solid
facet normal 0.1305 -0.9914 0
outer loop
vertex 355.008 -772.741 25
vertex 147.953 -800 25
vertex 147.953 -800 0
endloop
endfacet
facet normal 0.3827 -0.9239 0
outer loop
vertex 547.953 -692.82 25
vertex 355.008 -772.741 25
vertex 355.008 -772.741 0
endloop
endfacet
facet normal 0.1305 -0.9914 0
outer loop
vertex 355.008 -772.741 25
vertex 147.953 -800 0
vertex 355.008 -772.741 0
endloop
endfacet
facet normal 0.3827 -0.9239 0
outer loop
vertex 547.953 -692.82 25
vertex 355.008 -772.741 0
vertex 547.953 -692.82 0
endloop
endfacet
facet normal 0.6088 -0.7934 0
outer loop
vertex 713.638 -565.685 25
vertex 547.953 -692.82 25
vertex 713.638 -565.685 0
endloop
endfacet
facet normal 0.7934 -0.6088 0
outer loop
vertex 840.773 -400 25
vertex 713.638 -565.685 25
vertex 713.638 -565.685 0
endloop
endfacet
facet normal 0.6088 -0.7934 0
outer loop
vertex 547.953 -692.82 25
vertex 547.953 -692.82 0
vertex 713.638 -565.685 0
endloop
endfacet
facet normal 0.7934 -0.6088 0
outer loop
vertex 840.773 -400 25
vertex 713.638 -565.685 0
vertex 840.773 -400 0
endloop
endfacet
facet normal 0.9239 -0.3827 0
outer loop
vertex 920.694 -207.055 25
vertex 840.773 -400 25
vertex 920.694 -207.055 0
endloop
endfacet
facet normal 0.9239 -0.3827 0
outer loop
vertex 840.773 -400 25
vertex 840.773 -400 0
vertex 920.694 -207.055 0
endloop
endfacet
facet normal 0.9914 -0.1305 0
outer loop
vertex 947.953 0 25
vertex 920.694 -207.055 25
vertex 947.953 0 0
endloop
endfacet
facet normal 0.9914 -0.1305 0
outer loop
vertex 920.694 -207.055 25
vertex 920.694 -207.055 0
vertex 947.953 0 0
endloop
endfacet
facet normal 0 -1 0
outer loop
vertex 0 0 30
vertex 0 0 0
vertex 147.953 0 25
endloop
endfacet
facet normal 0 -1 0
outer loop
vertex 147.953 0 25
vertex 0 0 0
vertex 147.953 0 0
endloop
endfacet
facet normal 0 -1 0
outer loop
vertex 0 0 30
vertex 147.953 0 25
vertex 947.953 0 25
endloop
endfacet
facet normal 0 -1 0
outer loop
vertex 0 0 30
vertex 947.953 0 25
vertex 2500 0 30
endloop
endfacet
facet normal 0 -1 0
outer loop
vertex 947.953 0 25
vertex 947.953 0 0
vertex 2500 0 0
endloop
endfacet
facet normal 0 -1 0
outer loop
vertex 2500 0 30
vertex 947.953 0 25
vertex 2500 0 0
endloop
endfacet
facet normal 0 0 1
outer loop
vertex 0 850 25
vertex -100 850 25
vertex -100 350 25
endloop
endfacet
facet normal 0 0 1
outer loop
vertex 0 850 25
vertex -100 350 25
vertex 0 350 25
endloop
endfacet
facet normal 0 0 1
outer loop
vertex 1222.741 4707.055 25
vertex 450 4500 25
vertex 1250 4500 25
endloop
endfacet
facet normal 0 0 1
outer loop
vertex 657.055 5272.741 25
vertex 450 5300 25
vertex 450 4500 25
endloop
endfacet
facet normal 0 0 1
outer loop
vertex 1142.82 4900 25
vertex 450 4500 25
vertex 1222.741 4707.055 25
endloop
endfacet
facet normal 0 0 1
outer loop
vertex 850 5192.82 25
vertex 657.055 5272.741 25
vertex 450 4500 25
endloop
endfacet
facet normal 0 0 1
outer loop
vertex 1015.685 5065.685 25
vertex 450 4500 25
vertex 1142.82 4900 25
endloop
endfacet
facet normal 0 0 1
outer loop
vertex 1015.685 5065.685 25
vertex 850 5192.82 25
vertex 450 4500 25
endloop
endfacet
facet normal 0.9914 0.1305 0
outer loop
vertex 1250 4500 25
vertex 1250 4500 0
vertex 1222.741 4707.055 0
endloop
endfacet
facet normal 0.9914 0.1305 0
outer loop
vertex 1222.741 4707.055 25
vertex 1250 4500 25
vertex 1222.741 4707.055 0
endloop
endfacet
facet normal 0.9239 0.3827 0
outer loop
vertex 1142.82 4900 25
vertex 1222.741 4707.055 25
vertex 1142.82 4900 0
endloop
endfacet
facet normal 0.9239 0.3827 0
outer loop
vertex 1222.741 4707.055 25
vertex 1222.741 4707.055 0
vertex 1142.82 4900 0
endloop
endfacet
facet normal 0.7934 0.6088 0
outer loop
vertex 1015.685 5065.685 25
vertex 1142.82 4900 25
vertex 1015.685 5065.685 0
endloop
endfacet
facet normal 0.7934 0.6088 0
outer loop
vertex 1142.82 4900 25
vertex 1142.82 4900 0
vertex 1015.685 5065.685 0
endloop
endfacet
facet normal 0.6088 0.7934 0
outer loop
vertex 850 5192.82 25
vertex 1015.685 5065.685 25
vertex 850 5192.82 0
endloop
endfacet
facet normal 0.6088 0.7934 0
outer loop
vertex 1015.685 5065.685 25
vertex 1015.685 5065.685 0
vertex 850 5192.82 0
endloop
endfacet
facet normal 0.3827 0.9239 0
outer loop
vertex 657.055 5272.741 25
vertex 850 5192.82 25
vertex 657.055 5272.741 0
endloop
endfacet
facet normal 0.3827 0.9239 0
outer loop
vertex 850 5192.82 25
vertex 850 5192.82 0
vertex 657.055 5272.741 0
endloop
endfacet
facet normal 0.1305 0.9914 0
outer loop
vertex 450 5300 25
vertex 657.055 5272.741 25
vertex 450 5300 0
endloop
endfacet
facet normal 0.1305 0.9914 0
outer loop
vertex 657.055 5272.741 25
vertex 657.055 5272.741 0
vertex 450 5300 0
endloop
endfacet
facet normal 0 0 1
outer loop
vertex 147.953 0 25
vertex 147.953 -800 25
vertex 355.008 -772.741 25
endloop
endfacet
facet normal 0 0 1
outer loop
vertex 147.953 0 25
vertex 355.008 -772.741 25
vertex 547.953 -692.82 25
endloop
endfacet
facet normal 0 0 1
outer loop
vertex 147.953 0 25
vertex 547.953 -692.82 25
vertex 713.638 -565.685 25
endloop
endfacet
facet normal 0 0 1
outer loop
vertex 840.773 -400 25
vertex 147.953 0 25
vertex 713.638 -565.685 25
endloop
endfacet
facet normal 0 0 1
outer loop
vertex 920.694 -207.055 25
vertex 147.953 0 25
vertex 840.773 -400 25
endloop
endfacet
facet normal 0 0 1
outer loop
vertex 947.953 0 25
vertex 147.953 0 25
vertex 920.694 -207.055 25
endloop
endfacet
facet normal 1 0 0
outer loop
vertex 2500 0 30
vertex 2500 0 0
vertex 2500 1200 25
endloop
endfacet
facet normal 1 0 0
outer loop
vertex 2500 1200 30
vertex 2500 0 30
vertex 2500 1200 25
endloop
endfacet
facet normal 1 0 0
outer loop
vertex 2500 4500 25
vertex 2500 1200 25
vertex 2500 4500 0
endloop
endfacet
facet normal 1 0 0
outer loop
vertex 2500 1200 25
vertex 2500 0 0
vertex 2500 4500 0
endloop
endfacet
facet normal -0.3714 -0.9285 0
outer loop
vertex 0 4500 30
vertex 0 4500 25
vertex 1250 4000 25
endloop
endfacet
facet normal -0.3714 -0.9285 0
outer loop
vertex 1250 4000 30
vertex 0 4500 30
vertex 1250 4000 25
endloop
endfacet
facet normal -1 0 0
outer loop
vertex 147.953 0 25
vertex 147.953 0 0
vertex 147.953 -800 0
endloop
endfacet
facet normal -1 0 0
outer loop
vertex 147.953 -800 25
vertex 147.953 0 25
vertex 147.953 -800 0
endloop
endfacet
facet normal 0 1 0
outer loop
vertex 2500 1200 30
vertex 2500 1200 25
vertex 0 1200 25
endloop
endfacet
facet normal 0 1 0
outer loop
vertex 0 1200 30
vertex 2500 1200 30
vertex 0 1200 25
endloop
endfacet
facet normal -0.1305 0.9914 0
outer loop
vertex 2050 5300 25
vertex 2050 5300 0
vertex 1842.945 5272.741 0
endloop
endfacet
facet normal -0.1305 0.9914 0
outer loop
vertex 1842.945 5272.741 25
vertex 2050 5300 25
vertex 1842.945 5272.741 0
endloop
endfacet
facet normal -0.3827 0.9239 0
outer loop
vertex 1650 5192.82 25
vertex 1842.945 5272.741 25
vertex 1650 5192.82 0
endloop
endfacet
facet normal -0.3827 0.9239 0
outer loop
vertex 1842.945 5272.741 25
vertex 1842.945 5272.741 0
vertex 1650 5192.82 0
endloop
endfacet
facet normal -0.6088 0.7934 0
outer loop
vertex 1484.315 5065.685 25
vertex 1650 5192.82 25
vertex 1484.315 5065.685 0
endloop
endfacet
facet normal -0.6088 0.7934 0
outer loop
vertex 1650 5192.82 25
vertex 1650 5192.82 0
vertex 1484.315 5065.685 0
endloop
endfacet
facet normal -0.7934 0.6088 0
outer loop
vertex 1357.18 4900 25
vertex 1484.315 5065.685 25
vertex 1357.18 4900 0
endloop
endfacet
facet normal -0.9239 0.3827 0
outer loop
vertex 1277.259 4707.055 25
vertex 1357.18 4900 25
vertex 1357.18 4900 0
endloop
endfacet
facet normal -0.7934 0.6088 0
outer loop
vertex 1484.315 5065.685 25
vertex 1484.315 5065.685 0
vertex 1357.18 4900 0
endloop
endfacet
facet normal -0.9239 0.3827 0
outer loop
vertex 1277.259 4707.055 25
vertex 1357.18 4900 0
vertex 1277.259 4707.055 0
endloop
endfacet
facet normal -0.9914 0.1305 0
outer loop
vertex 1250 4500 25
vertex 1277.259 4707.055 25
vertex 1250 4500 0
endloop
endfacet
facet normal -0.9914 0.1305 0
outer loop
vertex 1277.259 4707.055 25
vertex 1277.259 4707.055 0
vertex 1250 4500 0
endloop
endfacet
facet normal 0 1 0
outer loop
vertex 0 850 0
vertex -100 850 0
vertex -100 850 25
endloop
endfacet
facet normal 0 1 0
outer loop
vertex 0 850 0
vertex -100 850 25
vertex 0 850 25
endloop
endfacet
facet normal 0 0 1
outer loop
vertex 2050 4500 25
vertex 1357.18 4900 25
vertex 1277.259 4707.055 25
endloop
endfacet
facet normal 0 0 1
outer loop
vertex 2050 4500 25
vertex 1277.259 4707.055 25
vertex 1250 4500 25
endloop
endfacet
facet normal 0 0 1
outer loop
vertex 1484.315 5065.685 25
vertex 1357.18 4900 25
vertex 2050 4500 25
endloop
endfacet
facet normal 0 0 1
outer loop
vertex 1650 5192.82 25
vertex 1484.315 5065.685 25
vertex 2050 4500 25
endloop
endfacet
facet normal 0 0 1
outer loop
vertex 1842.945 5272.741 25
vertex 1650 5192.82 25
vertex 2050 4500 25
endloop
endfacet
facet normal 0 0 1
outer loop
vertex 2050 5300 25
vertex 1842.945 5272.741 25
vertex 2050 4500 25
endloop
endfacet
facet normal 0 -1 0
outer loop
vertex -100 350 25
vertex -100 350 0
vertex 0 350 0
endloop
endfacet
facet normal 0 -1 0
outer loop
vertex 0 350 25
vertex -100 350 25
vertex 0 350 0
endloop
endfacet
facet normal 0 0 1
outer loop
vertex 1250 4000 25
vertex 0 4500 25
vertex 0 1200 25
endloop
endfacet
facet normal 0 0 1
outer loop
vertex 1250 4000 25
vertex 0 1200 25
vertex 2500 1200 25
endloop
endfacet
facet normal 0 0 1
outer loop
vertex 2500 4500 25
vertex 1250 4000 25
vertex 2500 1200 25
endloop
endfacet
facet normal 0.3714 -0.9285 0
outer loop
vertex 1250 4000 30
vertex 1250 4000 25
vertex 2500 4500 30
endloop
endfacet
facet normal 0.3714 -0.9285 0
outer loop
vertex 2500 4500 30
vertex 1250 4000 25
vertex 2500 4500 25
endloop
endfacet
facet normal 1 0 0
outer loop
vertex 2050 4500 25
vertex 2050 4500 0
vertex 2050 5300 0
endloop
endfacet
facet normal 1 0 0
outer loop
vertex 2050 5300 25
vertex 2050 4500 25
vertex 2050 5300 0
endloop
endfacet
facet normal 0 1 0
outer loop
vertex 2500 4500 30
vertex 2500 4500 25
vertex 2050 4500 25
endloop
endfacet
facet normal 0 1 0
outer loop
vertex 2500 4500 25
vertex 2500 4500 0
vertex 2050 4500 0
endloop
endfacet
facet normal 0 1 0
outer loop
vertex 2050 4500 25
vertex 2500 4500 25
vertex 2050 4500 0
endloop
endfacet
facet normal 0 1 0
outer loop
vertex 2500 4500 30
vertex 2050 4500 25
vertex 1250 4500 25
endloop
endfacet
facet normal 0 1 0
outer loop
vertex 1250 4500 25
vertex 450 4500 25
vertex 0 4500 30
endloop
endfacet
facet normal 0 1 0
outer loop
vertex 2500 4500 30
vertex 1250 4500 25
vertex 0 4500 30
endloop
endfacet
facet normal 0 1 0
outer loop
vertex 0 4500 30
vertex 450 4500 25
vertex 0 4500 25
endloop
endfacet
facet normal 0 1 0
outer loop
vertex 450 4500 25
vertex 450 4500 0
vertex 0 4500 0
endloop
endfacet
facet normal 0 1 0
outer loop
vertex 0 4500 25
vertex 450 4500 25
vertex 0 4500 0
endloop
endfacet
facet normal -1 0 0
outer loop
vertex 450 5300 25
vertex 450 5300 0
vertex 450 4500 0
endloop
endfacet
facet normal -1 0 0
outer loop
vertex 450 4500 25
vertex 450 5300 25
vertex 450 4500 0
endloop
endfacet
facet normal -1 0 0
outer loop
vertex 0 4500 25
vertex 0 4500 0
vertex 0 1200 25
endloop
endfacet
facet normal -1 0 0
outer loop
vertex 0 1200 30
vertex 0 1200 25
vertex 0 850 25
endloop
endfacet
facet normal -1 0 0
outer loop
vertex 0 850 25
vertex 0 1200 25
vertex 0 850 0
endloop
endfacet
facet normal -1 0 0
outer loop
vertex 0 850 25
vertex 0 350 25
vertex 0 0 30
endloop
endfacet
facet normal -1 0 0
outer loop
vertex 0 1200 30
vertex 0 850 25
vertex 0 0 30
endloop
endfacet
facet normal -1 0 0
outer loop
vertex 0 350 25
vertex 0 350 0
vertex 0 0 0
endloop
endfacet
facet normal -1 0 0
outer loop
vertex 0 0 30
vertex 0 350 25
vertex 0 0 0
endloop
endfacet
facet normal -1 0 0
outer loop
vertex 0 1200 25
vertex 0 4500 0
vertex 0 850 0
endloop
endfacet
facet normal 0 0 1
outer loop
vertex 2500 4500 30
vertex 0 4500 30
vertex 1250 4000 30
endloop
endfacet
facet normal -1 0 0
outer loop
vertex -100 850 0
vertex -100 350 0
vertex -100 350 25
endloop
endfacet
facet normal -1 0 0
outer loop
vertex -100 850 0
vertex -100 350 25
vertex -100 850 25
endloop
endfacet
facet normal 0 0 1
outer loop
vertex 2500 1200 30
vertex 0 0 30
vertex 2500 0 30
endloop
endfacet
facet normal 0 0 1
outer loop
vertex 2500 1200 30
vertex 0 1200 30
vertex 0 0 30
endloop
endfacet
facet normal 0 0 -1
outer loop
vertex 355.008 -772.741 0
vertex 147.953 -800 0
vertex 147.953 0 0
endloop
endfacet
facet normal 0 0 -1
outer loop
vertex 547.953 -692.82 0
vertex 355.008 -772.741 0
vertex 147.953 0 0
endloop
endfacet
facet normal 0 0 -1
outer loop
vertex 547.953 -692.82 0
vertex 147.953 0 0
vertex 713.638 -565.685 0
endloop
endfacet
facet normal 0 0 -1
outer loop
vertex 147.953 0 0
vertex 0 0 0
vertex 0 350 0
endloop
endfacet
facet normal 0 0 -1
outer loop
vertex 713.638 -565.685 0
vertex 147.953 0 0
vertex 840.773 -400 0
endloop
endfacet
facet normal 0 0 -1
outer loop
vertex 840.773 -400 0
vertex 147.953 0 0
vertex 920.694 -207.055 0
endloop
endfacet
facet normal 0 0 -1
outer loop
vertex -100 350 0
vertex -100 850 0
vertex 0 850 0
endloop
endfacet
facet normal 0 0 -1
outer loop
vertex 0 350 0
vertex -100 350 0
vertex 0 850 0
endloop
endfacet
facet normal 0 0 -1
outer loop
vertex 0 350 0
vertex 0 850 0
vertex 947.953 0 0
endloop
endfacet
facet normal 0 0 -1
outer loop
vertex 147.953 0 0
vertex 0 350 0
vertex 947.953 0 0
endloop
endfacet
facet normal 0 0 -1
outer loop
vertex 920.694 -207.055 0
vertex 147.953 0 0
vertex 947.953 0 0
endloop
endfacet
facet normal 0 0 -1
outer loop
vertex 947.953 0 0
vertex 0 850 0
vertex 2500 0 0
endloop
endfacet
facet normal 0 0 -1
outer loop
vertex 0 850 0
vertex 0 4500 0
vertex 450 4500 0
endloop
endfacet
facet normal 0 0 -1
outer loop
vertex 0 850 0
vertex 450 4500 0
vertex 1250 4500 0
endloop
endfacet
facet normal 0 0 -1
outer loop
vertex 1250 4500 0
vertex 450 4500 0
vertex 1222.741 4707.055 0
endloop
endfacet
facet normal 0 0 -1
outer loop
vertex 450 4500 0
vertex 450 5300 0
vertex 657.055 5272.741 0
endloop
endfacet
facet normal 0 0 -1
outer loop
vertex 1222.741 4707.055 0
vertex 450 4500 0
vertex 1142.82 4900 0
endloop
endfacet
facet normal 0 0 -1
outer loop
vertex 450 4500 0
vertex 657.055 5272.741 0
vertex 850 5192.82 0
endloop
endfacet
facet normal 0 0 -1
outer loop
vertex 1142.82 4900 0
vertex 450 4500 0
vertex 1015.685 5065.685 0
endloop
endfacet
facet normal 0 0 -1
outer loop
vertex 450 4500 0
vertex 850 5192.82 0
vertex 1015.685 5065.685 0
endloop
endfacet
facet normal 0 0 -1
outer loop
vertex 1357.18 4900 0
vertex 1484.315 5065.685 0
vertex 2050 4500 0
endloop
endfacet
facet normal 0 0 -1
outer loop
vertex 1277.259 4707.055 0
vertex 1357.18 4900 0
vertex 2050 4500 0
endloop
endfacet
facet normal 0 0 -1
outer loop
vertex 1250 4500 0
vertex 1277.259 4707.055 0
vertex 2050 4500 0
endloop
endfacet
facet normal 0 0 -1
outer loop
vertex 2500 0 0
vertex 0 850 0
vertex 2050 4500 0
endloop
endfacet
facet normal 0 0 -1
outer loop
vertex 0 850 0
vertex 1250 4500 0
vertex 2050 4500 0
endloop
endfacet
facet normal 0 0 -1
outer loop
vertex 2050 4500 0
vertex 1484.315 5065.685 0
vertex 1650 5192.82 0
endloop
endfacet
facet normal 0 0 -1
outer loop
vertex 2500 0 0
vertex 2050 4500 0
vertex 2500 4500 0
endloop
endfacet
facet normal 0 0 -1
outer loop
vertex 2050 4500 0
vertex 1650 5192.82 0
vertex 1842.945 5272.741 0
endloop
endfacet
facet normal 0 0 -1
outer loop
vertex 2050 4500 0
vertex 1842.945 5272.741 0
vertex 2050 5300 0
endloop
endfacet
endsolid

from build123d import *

# Parameters (mm, degrees)
F0_W     = 100
F0_H     = 500
F1_DEPTH = 25
F2_DEPTH = 30
F3_DEPTH = 30


with BuildPart() as f1:
    # F0 (on Top) → F1 (new body)
    with BuildSketch(Plane.XY):
        with BuildLine():
            Line((450, 5300), (450, 4500))
            Line((450, 4500), (1250, 4500))
            ThreePointArc((1250, 4500), (1015.685425, 5065.685425), (450, 5300))
        make_face()
        with BuildLine():
            Line((1250, 4500), (2050, 4500))
            Line((2050, 4500), (2050, 5300))
            ThreePointArc((2050, 5300), (1484.314575, 5065.685425), (1250, 4500))
        make_face()
        Polygon((0, 4500), (0, 1200), (2500, 1200), (2500, 4500), (1250, 4000), align=None)
        with Locations((-50, 600)):
            Rectangle(F0_W, F0_H)
        with BuildLine():
            Line((947.952855, 0), (147.952855, 0))
            Line((147.952855, 0), (147.952855, -800))
            ThreePointArc((147.952855, -800), (713.63828, -565.685425), (947.952855, 0))
        make_face()
    extrude(amount=F1_DEPTH)

    # F0 (on Top) → F2 (join)
    with BuildSketch(Plane.XY):
        Polygon((450, 4500), (0, 4500), (1250, 4000), (2500, 4500), (2050, 4500), (1250, 4500), align=None)
    extrude(amount=F2_DEPTH)

    # F0 (on Top) → F3 (join)
    with BuildSketch(Plane.XY):
        Polygon((0, 350), (0, 0), (147.952855, 0), (947.952855, 0), (2500, 0), (2500, 1200), (0, 1200), (0, 850), align=None)
    extrude(amount=F3_DEPTH)


solid = f1.part
